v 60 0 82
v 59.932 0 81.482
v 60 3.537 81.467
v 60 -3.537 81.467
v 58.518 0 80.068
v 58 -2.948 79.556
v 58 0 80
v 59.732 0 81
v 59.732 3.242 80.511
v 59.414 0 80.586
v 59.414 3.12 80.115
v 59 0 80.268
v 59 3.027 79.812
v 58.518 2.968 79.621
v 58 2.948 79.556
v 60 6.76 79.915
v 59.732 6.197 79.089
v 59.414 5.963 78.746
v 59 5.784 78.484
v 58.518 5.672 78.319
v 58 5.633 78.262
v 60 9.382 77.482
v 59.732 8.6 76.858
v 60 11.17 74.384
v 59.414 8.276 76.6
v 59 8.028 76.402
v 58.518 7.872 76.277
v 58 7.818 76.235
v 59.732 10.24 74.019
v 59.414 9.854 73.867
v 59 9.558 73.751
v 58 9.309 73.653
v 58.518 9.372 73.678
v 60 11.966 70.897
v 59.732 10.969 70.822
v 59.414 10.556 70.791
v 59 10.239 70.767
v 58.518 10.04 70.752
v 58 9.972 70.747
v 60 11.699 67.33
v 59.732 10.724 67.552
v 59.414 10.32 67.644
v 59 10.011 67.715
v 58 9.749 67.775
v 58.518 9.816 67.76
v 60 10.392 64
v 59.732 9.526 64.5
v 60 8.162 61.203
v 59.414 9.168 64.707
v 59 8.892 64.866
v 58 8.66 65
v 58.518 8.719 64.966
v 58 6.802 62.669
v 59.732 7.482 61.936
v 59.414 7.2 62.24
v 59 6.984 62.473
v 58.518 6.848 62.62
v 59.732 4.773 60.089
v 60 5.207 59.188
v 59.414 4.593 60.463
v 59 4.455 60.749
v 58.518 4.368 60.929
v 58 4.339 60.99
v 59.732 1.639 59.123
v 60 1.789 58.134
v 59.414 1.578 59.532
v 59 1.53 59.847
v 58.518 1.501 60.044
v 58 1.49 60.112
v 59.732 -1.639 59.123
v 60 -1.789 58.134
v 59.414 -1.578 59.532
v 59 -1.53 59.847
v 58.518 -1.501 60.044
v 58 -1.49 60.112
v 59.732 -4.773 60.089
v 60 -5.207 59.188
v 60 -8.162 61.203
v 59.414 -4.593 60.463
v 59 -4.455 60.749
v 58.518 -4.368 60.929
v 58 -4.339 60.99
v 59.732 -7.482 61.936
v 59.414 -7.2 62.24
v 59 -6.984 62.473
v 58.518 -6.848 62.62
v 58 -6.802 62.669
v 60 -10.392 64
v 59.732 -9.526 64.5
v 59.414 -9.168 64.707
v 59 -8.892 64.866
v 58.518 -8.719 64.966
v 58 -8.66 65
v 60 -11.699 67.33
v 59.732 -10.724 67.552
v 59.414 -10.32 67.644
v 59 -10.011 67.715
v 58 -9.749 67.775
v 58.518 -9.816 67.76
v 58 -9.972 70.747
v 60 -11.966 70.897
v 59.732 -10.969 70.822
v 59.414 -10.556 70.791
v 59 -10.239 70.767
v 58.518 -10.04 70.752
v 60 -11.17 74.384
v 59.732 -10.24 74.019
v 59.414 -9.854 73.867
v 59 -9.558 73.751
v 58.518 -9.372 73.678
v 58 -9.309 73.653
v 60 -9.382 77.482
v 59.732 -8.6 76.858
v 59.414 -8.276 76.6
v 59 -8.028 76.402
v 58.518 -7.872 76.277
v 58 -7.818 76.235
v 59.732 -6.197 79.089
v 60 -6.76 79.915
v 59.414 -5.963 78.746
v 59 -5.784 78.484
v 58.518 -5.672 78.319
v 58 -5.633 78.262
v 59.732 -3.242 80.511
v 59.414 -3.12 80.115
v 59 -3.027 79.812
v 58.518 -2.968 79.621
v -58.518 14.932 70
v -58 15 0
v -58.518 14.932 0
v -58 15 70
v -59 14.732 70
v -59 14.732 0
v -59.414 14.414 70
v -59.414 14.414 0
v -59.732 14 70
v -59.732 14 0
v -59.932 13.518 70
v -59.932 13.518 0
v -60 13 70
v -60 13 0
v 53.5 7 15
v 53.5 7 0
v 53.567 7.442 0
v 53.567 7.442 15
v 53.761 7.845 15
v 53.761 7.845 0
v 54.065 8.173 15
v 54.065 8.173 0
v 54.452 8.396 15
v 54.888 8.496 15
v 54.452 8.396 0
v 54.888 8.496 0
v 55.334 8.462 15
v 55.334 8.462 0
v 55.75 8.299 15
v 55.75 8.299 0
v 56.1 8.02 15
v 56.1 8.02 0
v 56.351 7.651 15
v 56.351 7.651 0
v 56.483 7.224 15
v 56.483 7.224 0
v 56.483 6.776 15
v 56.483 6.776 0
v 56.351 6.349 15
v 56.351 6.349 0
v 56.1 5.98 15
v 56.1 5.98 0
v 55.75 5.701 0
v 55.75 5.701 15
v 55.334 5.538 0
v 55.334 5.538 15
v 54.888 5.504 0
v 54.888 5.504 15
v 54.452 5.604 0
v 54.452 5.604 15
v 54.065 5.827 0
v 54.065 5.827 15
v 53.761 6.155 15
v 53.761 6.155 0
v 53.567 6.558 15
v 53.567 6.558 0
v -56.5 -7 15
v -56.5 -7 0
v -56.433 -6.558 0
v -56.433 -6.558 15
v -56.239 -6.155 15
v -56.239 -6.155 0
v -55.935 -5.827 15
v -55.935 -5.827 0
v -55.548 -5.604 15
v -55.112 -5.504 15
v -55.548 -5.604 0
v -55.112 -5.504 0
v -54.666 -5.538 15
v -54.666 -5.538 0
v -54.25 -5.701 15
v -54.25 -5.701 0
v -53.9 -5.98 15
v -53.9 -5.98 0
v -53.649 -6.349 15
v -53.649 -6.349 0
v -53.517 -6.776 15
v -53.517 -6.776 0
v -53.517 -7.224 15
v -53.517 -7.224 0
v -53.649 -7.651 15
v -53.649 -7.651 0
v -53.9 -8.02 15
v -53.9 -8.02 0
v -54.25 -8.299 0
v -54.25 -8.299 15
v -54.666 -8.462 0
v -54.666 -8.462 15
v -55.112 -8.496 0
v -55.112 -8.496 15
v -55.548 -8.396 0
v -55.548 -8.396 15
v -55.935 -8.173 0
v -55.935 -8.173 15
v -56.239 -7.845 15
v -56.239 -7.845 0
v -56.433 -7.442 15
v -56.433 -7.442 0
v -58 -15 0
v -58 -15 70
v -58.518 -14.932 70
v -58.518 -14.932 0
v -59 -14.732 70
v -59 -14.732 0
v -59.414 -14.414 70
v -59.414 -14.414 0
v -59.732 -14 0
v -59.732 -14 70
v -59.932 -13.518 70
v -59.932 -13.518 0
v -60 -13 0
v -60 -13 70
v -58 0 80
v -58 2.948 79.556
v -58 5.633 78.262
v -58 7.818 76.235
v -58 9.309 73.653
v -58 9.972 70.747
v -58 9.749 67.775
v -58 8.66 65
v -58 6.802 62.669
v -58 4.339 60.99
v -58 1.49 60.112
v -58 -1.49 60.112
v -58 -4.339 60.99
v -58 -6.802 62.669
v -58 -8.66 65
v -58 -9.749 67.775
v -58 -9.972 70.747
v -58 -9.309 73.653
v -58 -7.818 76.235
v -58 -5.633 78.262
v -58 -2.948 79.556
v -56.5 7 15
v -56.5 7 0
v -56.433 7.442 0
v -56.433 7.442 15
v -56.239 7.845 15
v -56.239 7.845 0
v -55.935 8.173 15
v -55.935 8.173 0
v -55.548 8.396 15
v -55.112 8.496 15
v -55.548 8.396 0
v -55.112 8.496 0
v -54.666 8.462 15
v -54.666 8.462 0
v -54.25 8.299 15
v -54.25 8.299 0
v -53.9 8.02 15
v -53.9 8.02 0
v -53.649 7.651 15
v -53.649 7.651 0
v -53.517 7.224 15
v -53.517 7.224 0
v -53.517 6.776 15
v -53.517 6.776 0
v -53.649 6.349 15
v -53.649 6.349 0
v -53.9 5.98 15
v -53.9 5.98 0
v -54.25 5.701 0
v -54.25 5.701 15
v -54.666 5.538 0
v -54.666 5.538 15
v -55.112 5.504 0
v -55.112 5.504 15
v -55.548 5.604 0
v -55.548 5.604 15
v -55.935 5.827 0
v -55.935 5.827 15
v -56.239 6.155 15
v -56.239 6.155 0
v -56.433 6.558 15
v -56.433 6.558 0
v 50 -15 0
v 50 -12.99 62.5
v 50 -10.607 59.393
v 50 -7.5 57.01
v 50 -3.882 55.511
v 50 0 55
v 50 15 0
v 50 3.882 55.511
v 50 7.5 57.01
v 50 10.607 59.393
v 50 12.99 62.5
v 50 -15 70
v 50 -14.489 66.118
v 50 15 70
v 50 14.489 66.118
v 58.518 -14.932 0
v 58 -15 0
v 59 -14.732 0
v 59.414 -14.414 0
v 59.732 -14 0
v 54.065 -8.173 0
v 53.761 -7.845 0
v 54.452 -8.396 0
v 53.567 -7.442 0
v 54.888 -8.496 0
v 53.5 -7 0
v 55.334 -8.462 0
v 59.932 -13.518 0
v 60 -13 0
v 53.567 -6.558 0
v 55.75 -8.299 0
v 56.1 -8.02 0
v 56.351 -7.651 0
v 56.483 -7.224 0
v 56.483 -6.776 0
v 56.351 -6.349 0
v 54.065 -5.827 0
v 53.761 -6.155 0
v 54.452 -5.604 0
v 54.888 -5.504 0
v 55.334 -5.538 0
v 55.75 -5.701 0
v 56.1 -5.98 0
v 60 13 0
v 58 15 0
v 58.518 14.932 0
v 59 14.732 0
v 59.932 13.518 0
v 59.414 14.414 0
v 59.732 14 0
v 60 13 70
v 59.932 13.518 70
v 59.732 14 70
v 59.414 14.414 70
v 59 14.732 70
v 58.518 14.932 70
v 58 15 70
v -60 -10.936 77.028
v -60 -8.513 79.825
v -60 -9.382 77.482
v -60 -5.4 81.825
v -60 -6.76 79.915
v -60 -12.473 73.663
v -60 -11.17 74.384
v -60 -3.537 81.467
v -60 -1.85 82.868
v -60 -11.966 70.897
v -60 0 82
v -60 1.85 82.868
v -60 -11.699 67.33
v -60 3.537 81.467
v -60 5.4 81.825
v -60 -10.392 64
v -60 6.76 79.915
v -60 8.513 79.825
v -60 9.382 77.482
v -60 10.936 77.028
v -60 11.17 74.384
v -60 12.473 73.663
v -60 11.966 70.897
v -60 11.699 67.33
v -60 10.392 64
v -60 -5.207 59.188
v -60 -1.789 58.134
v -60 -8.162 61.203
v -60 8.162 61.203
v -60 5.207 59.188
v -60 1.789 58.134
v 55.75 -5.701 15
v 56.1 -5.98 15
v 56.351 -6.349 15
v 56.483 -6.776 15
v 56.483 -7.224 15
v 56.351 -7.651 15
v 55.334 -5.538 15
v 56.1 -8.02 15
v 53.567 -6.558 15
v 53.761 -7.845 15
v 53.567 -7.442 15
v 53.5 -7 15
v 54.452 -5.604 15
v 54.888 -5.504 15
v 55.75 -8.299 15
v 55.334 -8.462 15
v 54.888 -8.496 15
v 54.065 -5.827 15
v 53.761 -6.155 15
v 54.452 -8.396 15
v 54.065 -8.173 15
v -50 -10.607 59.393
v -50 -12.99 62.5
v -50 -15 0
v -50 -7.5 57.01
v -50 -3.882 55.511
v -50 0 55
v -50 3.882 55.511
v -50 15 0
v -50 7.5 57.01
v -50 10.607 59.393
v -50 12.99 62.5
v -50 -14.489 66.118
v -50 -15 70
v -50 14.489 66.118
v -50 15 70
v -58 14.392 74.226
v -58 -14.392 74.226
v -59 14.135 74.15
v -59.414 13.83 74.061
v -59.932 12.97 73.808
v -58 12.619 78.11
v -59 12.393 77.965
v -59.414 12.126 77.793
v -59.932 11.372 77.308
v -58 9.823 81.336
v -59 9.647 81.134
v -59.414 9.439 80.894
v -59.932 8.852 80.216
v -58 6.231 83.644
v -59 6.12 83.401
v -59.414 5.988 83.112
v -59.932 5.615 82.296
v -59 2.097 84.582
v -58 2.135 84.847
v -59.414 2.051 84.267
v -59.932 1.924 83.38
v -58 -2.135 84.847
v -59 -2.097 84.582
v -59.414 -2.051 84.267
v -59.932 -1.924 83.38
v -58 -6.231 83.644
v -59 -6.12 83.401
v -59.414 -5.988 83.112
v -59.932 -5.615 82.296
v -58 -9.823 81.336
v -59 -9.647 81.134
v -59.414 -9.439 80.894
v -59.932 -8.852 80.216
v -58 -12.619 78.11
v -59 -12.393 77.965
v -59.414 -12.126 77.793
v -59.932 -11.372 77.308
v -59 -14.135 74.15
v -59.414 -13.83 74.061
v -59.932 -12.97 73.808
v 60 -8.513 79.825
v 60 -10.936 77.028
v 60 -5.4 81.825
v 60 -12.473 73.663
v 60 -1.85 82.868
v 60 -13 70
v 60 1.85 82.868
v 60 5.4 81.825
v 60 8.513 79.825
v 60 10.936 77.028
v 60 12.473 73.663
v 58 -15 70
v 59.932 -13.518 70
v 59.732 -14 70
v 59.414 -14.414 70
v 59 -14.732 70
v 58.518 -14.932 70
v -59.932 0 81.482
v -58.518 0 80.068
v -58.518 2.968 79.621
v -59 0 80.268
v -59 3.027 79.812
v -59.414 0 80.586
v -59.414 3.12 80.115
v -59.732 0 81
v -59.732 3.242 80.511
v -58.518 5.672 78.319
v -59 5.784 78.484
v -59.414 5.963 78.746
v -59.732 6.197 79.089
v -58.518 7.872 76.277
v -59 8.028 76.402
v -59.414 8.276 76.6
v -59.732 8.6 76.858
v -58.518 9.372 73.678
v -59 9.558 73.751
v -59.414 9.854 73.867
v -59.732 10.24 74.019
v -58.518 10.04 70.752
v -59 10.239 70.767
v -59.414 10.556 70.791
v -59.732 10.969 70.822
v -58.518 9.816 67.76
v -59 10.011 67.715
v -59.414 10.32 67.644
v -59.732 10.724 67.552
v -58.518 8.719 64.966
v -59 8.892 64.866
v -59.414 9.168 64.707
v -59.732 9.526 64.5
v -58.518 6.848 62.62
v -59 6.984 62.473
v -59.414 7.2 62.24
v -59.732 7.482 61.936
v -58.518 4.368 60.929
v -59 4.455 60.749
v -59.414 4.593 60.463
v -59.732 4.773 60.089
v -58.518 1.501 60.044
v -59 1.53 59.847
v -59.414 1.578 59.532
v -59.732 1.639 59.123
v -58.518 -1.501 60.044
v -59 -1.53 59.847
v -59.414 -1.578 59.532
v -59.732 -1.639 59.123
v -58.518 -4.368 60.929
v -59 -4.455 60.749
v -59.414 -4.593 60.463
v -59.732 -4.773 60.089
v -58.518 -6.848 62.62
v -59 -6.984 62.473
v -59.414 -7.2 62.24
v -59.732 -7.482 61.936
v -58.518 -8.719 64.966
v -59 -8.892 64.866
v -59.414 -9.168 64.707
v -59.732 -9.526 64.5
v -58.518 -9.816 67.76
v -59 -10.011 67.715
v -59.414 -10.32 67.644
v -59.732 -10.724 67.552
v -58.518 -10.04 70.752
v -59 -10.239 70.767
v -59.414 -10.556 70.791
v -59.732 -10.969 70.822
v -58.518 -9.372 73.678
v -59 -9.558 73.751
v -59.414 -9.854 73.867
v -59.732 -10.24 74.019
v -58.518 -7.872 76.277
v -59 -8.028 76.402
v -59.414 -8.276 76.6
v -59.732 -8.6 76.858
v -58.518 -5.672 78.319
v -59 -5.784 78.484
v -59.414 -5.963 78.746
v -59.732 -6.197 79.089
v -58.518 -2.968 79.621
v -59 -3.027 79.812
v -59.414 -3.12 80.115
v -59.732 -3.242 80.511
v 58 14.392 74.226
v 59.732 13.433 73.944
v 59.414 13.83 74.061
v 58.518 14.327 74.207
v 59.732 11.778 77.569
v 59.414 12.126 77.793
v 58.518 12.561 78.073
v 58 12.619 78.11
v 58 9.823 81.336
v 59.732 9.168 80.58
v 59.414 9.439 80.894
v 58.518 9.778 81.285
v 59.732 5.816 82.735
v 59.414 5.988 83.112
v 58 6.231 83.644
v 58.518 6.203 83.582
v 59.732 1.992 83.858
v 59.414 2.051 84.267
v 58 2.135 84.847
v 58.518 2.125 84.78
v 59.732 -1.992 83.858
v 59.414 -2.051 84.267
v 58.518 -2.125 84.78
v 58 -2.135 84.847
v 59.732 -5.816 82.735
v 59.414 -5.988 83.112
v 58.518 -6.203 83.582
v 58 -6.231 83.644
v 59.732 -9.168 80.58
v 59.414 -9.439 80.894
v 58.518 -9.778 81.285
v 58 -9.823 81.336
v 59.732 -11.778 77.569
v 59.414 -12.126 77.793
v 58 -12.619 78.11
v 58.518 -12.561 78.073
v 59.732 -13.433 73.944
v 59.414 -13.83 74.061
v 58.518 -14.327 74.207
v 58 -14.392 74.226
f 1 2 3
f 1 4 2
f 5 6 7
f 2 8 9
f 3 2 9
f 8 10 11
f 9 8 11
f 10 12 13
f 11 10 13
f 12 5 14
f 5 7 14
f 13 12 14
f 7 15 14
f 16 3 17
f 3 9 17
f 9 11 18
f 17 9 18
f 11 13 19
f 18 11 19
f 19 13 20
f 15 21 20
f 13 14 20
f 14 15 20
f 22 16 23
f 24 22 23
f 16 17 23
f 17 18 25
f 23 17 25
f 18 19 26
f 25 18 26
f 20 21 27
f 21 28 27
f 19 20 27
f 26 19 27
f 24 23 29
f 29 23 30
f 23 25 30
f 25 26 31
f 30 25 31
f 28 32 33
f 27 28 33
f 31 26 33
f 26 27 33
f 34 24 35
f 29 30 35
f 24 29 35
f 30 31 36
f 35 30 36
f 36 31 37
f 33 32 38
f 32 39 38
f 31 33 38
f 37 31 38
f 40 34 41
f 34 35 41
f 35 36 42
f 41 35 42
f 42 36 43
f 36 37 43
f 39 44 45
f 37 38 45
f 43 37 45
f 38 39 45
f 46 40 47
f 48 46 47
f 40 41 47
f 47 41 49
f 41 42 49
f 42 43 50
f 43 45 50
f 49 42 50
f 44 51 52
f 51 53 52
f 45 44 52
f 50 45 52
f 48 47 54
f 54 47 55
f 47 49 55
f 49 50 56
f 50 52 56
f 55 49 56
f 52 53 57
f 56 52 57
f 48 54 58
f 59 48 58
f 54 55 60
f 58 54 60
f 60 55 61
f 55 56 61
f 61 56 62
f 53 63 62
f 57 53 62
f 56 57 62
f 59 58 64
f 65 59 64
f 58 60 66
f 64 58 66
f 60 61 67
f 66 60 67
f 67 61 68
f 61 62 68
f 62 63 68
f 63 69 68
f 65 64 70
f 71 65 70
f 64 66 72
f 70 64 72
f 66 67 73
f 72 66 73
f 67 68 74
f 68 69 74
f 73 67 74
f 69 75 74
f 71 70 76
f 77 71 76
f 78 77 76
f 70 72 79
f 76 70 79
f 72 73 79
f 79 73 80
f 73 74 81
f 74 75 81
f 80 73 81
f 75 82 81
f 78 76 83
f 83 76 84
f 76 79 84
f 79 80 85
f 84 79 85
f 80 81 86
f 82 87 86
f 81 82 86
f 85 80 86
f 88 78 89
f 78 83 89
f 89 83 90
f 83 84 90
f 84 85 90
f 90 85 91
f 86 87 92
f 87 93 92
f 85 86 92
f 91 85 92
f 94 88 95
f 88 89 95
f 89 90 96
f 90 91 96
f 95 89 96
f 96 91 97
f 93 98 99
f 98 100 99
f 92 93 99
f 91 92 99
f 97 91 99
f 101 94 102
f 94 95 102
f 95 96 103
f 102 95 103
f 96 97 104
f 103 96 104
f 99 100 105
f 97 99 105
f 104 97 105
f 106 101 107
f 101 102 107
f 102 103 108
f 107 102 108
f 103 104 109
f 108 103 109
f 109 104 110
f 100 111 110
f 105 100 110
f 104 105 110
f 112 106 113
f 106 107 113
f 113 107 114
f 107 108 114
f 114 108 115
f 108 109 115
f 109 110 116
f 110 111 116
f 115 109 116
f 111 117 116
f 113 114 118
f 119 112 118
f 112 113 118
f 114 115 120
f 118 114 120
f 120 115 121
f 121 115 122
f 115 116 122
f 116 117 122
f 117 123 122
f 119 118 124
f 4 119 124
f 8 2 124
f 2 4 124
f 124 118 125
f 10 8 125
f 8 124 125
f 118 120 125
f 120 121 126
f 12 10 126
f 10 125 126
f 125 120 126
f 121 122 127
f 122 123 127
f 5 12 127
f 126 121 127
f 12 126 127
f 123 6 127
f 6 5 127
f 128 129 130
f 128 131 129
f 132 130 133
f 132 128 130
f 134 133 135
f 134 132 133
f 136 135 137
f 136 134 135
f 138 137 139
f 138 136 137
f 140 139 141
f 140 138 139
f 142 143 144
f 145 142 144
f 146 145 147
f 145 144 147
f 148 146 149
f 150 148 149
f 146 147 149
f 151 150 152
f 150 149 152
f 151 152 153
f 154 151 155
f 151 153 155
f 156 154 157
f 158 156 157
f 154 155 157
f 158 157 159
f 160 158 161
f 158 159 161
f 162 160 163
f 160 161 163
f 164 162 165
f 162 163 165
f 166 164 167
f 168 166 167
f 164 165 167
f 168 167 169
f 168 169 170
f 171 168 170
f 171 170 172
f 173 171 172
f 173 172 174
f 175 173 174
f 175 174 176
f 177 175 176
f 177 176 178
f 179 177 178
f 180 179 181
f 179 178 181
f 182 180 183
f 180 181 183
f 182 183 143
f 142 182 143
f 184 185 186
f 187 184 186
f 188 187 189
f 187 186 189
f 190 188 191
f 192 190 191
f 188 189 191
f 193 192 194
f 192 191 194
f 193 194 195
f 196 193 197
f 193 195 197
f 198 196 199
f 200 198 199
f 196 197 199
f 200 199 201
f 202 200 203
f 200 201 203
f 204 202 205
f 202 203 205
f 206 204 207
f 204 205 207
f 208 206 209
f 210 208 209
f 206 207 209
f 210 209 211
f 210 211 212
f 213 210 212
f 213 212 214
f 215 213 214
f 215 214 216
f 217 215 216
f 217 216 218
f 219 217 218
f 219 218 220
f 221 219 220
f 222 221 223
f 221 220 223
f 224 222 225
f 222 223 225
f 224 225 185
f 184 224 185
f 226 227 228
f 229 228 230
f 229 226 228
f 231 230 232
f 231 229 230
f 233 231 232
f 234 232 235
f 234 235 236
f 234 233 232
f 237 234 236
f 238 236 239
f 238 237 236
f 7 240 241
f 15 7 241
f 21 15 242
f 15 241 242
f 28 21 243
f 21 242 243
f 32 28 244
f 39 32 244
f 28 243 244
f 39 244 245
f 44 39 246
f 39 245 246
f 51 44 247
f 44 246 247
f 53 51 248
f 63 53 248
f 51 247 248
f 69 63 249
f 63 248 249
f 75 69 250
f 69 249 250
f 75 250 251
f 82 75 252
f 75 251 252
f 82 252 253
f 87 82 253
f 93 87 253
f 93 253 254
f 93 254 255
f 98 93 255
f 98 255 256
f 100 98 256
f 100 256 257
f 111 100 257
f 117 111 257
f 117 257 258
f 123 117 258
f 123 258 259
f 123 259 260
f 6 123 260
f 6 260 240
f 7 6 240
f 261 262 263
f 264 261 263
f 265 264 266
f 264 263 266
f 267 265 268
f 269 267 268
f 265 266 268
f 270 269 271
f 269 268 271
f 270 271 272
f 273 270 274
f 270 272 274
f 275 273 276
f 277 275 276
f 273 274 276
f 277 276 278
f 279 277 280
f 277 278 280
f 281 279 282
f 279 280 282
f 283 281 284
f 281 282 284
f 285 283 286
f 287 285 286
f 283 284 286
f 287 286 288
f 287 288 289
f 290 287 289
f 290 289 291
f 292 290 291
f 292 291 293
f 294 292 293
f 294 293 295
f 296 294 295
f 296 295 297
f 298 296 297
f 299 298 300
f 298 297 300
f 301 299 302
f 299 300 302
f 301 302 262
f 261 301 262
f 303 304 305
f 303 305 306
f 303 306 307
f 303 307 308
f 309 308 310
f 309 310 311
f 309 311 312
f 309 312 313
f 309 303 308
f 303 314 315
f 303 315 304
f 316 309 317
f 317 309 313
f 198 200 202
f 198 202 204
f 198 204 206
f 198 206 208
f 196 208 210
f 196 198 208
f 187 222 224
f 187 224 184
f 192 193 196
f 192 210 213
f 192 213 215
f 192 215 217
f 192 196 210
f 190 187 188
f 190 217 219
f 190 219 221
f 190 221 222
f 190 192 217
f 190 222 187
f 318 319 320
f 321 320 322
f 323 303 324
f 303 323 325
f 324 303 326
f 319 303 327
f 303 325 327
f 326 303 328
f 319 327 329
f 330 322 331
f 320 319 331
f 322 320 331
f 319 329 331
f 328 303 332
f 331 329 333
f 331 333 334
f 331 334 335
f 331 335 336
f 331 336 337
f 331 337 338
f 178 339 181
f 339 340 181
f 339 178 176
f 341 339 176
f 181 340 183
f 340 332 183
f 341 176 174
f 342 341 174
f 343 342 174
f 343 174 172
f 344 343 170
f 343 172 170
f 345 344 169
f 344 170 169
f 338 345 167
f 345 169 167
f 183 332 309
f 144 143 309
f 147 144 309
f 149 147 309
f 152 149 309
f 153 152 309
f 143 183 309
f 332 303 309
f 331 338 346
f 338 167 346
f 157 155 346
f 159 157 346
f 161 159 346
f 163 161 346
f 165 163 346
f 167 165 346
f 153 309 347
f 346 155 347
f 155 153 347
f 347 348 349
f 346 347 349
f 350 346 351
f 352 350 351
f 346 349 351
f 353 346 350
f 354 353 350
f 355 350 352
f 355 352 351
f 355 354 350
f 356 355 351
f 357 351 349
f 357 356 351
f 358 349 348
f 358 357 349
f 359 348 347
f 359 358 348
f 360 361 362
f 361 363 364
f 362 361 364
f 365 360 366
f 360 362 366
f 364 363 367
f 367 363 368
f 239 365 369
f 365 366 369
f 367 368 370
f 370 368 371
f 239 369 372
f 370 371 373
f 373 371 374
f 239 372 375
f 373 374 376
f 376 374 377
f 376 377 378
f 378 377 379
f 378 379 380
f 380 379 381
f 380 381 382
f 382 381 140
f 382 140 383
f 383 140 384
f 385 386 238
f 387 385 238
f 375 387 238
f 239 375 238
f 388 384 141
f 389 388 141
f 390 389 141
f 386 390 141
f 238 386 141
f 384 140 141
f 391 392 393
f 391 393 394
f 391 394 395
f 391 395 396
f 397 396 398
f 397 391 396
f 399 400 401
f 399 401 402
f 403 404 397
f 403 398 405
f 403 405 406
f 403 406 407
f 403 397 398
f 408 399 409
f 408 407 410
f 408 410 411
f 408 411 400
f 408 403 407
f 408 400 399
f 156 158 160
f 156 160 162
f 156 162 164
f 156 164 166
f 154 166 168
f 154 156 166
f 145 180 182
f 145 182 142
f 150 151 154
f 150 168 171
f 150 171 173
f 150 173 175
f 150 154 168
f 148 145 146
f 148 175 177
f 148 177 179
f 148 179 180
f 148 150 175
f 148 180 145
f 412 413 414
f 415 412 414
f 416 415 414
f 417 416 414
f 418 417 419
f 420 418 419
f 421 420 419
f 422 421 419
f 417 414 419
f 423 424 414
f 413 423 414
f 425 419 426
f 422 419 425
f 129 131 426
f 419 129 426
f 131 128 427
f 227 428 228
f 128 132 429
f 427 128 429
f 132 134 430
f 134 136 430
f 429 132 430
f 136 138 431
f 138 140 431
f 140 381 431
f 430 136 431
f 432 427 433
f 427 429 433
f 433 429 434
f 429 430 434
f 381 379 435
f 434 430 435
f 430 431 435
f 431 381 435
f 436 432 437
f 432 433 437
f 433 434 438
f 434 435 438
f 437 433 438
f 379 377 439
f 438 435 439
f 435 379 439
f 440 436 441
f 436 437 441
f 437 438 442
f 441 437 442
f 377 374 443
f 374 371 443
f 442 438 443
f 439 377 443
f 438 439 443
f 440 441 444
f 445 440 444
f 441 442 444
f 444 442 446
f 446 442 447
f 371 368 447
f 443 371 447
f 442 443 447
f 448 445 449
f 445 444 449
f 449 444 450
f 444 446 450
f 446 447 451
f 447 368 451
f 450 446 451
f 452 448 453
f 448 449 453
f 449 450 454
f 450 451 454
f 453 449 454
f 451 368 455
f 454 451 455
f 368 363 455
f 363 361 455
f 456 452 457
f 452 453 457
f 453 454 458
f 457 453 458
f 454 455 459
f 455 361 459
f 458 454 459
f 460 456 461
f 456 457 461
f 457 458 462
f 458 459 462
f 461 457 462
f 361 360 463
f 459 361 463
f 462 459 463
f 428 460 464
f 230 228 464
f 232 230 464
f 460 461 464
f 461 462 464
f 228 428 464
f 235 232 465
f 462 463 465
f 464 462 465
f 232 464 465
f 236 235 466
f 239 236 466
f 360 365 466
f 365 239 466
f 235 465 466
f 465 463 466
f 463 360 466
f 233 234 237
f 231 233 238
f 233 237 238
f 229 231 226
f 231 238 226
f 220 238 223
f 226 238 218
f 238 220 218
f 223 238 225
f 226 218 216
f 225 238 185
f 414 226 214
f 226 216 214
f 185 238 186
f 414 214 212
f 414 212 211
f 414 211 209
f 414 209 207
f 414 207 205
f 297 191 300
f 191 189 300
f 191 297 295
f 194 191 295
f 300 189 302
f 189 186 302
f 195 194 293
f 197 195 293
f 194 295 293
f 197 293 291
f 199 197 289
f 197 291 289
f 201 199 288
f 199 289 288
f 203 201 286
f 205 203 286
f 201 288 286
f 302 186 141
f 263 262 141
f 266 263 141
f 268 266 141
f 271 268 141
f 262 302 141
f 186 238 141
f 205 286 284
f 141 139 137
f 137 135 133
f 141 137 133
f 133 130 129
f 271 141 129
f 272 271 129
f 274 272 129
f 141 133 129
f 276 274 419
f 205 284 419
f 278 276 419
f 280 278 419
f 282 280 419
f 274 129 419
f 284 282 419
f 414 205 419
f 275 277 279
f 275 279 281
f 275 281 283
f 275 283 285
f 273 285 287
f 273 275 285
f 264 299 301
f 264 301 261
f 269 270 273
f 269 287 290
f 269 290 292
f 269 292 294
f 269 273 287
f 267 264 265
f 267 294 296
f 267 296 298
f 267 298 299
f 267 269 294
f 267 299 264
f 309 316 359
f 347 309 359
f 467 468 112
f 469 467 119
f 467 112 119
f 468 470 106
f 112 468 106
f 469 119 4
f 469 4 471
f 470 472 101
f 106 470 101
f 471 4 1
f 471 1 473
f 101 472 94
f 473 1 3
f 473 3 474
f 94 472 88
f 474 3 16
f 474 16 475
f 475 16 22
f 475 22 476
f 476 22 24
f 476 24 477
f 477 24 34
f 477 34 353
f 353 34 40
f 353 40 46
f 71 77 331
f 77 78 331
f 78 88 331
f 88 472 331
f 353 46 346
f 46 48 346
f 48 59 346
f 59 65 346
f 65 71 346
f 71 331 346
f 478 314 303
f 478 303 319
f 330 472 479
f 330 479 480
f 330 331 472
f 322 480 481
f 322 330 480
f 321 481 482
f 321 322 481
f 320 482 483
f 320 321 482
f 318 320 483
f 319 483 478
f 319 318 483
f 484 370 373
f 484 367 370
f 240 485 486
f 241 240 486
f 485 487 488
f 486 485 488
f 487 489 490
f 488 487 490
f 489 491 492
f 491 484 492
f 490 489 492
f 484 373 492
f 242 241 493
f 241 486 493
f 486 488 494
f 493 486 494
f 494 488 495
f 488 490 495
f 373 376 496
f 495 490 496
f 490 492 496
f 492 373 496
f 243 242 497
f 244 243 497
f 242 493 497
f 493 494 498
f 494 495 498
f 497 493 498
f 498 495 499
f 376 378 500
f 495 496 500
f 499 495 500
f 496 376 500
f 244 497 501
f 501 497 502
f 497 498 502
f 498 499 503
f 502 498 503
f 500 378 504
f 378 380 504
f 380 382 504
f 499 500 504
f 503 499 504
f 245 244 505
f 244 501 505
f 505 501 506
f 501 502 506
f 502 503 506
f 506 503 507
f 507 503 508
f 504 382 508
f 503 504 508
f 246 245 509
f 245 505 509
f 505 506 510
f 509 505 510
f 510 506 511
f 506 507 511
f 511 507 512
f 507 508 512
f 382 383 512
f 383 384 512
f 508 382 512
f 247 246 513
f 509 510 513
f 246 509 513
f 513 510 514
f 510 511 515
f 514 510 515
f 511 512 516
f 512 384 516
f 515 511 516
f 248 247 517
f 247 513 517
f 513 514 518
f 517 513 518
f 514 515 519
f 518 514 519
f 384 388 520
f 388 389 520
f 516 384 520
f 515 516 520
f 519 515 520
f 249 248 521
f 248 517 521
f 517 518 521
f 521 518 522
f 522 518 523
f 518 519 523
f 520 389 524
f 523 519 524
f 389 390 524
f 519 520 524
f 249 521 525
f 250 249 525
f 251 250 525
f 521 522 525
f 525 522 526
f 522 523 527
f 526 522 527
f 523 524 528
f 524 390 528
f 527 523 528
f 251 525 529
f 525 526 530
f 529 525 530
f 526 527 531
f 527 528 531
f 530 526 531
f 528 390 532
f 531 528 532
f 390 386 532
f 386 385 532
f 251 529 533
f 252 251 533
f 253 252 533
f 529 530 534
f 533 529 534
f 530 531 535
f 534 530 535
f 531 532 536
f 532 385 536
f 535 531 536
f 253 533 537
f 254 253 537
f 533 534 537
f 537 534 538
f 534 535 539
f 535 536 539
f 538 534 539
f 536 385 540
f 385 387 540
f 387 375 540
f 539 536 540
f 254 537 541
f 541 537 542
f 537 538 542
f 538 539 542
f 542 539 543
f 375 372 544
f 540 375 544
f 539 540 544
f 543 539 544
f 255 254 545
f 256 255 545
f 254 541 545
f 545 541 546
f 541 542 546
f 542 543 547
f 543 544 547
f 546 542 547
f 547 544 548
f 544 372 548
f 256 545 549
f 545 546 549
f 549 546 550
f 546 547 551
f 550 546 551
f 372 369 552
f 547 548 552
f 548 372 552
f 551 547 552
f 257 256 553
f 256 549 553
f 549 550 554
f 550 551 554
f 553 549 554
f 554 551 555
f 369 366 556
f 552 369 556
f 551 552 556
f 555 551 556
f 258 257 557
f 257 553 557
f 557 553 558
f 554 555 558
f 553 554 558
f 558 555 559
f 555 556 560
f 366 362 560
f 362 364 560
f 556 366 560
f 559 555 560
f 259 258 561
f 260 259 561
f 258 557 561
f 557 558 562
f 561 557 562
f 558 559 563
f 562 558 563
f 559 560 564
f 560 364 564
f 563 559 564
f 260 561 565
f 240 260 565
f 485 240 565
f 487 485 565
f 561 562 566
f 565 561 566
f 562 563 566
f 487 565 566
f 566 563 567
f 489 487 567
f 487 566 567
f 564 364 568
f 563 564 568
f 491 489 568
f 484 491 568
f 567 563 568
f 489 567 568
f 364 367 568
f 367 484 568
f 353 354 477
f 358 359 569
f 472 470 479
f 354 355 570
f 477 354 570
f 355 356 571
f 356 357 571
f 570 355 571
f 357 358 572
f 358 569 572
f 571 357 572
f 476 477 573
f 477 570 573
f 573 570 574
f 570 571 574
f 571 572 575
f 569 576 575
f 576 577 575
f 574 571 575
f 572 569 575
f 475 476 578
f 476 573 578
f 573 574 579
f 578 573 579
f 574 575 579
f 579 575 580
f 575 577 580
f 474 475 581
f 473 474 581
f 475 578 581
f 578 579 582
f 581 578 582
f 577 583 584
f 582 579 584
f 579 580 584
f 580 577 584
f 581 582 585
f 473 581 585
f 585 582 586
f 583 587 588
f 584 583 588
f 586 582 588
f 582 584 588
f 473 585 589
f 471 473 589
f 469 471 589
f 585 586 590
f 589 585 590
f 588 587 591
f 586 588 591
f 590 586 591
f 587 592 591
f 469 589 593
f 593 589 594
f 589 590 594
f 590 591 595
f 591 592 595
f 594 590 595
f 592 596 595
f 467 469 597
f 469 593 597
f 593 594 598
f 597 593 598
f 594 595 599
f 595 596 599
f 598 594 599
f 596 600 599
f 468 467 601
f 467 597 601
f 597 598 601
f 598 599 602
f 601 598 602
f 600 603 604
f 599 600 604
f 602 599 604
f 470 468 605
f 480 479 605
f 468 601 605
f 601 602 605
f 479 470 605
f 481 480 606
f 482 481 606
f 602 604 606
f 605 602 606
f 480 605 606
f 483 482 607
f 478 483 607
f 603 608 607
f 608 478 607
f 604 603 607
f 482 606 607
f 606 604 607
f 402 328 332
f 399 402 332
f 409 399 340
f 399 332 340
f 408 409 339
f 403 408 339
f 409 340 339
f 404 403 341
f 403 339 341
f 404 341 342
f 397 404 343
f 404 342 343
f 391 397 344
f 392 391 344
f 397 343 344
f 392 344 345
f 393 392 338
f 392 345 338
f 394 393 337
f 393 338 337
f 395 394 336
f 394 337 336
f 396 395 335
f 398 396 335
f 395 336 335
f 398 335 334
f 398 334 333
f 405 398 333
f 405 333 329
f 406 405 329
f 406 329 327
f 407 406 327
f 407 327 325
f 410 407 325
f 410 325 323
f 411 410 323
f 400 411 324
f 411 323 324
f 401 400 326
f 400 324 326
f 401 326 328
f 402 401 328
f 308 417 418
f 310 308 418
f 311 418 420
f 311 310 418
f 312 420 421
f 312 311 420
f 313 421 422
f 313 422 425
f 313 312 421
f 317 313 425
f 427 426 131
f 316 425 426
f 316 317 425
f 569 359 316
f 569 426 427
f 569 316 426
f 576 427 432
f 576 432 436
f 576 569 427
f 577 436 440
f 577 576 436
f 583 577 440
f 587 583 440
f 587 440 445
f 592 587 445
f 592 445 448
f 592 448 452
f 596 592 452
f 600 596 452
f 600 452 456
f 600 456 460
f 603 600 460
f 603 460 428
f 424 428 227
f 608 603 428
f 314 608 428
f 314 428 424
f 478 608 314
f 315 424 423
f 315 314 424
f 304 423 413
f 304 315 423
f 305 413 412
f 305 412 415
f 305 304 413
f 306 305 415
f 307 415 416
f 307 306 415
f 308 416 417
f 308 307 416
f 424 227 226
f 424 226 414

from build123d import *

# Parameters (mm, degrees)
SKETCH1_W                      = 10
SKETCH1_H                      = 30
BOSS_EXTRUDE1_DEPTH            = 70
BOSS_EXTRUDE1_2_DEPTH          = 70
SKETCH2_R                      = 15
BOSS_EXTRUDE2_DEPTH            = 120
CUT_EXTRUDE1_REACH             = 122
SKETCH3_R                      = 10
CUT_EXTRUDE1_DIRECTION_2_DEPTH = 1
FILLET1_R                      = 2
SKETCH4_R                      = 1.5
CUT_EXTRUDE2_DEPTH             = 15


with BuildPart() as part:
    # Sketch1 → Boss-Extrude1 (new body)
    with BuildSketch(Plane.XY):
        with Locations((55, 0)):
            Rectangle(SKETCH1_W, SKETCH1_H)
    extrude(amount=BOSS_EXTRUDE1_DEPTH)



with BuildPart() as body_2:
    # Sketch1 → Boss-Extrude1 2 (new body)
    with BuildSketch(Plane.XY):
        with Locations((-55, 0)):
            Rectangle(SKETCH1_W, SKETCH1_H)
    extrude(amount=BOSS_EXTRUDE1_2_DEPTH)


with BuildPart() as part_1:
    add(part.part)

    add(body_2.part)  # Boss-Extrude2 merges body 2
    # Sketch2 → Boss-Extrude2 (add)
    with BuildSketch(Plane(origin=(60, 0, 0), x_dir=(0, 0, -1), z_dir=(1, 0, 0))):
        with Locations((-70, 0)):
            Circle(SKETCH2_R)
    extrude(amount=-BOSS_EXTRUDE2_DEPTH)

    # Sketch3 → Cut-Extrude1 (cut, up to next)
    with BuildSketch(Plane.ZY.offset(60), mode=Mode.PRIVATE) as cut_extrude1_sk1:
        with Locations((70, 0)):
            Circle(SKETCH3_R)
    cut_extrude1_tool1 = extrude(cut_extrude1_sk1.sketch, amount=-CUT_EXTRUDE1_REACH, mode=Mode.PRIVATE) & part_1.part
    add(cut_extrude1_tool1.solids().sort_by_distance((-60, 0, 70))[0], mode=Mode.SUBTRACT)

    # Sketch3 → Cut-Extrude1 direction 2 (cut)
    with BuildSketch(Plane.ZY.offset(60)):
        with Locations((70, 0)):
            Circle(SKETCH3_R)
    extrude(amount=CUT_EXTRUDE1_DIRECTION_2_DEPTH, mode=Mode.SUBTRACT)

    # Fillet1
    fillet1_edges = [part_1.edges().sort_by_distance(p)[0] for p in [
        (60, 0, 85),
        (-60, 0, 85),
        (-60, 15, 35),
        (-60, -15, 35),
        (-60, 0, 60),
        (60, 0, 60),
        (60, 15, 35),
        (60, -15, 35),
    ]]
    fillet(fillet1_edges, radius=FILLET1_R)

    # Sketch4 → Cut-Extrude2 (cut)
    with BuildSketch(Plane(origin=(0, 0, 0), x_dir=(-1, 0, 0), z_dir=(0, 0, -1))):
        with Locations((-55, 7)):
            Circle(SKETCH4_R)
        with Locations((-55, -7)):
            Circle(SKETCH4_R)
        with Locations((55, -7)):
            Circle(SKETCH4_R)
        with Locations((55, 7)):
            Circle(SKETCH4_R)
    extrude(amount=-CUT_EXTRUDE2_DEPTH, mode=Mode.SUBTRACT)


solid = part_1.part
